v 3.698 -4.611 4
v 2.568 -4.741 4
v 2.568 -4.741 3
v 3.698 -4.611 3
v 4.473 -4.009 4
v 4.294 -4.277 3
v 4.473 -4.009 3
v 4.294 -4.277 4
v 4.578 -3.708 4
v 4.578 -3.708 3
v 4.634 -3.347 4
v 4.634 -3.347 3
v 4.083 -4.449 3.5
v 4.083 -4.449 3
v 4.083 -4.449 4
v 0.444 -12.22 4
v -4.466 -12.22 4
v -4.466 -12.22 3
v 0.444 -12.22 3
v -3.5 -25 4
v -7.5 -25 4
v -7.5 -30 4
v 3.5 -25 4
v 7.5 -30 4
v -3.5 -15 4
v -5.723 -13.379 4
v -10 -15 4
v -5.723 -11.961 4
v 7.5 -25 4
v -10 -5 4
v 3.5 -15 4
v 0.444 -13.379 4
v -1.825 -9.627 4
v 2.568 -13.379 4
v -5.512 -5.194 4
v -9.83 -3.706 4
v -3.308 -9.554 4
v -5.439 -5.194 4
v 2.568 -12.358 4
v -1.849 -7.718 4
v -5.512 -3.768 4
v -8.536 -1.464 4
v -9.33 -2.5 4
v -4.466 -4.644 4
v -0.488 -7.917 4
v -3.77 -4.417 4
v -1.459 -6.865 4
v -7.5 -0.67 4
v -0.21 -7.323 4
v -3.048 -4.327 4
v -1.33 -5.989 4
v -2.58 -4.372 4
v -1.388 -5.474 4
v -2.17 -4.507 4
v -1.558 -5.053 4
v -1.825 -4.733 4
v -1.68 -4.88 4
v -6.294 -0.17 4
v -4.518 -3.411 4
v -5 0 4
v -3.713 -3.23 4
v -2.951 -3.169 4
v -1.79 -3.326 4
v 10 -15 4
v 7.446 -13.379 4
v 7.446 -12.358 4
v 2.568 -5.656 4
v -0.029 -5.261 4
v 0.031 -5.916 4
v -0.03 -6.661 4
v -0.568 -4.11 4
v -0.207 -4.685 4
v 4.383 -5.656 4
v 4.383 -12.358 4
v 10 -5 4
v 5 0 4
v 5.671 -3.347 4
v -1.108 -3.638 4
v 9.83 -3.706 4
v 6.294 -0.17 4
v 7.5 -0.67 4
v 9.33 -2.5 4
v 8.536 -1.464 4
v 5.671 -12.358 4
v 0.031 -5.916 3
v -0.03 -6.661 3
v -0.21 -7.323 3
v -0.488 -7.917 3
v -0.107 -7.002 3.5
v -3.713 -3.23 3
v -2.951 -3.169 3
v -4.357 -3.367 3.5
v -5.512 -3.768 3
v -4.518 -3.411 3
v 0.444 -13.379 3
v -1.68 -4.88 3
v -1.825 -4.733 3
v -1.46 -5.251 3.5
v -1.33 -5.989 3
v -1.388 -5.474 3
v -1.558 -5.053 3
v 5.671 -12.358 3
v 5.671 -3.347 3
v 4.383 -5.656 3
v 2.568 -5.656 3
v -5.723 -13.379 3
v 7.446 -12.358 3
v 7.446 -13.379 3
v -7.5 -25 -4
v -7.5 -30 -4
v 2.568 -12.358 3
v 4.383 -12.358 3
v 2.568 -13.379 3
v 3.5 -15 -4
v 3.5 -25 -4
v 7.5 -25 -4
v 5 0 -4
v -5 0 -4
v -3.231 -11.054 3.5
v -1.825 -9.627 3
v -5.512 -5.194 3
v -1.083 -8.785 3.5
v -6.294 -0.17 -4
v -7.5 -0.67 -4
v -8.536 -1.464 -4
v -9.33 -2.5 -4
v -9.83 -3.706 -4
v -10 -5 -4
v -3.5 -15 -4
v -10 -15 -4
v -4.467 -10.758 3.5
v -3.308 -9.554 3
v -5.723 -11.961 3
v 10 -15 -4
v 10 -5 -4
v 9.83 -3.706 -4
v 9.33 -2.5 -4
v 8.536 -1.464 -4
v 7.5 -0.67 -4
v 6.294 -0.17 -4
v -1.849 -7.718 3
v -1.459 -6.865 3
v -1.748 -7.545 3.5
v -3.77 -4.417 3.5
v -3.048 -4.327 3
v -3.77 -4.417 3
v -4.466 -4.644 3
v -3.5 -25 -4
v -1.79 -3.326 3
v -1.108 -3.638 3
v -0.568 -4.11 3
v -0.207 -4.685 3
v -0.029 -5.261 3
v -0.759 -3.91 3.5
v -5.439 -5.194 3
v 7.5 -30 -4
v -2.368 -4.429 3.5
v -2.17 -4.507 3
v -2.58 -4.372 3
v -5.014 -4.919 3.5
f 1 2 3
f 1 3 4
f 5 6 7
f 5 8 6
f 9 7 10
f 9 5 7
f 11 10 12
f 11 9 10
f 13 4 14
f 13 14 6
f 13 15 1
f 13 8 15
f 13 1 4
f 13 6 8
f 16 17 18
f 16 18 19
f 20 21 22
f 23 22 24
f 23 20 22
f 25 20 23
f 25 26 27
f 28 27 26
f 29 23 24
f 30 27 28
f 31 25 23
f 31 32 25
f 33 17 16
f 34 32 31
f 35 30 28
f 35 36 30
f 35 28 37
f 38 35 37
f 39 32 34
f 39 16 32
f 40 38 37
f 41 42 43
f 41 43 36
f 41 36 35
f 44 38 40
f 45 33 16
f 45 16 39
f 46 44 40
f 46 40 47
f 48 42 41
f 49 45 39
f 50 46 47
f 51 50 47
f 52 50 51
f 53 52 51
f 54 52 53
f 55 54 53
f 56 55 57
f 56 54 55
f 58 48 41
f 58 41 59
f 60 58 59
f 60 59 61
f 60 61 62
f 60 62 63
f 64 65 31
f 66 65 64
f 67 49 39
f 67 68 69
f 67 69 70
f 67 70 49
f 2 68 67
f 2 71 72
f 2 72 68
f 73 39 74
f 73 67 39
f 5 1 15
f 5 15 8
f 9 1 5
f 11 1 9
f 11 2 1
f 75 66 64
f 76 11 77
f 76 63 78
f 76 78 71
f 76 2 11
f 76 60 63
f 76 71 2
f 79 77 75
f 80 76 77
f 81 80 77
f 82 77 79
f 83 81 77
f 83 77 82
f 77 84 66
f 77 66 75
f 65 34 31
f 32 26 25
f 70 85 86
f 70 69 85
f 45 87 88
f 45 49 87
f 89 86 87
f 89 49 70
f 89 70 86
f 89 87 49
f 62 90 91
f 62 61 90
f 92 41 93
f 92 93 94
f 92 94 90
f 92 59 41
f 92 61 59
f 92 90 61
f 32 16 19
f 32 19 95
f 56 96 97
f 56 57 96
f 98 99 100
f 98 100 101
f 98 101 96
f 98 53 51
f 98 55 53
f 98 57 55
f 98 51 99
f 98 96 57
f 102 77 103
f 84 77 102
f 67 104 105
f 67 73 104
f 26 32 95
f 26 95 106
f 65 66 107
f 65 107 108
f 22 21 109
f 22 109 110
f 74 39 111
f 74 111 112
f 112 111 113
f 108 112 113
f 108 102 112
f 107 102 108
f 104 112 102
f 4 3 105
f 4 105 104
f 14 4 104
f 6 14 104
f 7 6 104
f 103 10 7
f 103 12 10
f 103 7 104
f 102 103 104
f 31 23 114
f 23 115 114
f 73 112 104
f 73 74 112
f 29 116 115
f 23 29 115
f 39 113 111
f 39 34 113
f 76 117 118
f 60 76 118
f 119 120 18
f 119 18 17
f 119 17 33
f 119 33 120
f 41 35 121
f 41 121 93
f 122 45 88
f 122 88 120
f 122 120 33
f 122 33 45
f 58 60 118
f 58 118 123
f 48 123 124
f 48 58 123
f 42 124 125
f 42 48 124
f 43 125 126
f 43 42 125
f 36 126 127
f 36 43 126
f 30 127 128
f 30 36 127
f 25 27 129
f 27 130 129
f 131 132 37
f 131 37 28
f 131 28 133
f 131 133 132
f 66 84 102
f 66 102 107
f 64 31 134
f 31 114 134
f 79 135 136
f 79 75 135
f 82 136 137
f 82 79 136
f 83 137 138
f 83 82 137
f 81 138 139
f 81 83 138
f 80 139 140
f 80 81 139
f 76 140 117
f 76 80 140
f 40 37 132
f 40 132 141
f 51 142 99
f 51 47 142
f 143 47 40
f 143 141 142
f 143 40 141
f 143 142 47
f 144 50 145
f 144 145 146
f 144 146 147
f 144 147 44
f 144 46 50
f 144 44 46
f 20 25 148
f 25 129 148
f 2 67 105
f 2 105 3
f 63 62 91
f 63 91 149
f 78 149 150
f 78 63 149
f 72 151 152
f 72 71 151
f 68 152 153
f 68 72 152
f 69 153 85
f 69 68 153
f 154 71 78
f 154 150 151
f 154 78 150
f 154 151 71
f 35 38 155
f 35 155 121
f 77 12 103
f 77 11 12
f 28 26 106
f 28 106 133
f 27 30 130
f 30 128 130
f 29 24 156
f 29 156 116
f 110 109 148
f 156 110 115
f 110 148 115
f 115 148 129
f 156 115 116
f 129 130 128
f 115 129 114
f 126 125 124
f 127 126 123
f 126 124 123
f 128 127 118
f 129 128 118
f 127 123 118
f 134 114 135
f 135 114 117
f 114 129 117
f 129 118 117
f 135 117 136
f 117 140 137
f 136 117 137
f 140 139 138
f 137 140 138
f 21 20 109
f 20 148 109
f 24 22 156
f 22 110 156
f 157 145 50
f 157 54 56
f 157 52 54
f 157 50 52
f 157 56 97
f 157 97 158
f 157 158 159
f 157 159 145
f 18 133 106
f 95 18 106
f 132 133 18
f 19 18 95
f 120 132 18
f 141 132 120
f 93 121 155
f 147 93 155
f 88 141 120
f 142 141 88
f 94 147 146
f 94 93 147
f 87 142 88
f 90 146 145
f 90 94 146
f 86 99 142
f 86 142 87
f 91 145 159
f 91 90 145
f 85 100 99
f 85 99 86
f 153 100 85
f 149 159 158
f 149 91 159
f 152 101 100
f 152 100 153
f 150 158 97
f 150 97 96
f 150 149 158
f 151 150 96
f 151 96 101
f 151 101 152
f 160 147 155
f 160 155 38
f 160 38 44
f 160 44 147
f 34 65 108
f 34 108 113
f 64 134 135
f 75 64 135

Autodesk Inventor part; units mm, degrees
ref_plane "XZ Plane" through (0, 0, 0) normal (0, 1, 0) x (-1, 0, 0)
ref_plane "XY Plane" through (0, 0, 0) normal (0, 0, 1) x (1, 0, 0)
sketch "스케치1" plane through (0, 0, 0) normal (0, 0, 1) x (1, 0, 0)
  line L0 (0, 0) -> (-10, 0)
  line L1 (-10, 0) -> (-10, -15)
  line L2 (-10, -15) -> (-3.5, -15)
  line L3 (-3.5, -15) -> (-3.5, -25)
  line L4 (-3.5, -25) -> (-7.5, -25)
  line L5 (-7.5, -25) -> (-7.5, -30)
  line L6 (-7.5, -30) -> (0, -30)
  line L7 (0, 0) -> (0, -30)
  dimension "d0" = 10
  dimension "d1" = 15
  dimension "d2" = 10
  dimension "d3" = 5
  dimension "d4" = 7.5
  dimension "d12" = 3.5
extrude "돌출1" add sketch "스케치1" along normal mid plane 8
mirror "미러1" about plane through (0, 0, 0) normal (1, 0, 0) of "돌출1"
fillet "모깎기1" radius 5 2 edges at (10, 0, 0) (-10, 0, 0)
sketch "스케치2" plane through (0, 0, 4) normal (0, 0, 1) x (1, 0, 0)
  line L0 (-6.452, -3.1686) -> (7.8296, -3.1686) construction
  line L1 (7.8296, -3.1686) -> (7.8296, -13.9142) construction
  line L2 (7.8296, -13.9142) -> (-6.452, -13.9142) construction
  line L3 (-6.452, -13.9142) -> (-6.452, -3.1686) construction
  line L4 (0.4443, -13.3793) -> (-5.7226, -13.3793)
  line L5 (-5.7226, -13.3793) -> (-5.7226, -11.9611)
  spline S0 degree 2 poles (-5.7226, -11.9611) (-5.0581, -11.3371) (-3.875, -10.1783) (-3.3077, -9.5543) knots 0 0 0 1 2 2 2
  spline S1 degree 2 poles (-3.3077, -9.5543) (-2.1651, -8.2982) (-1.3304, -6.7909) (-1.3304, -5.9887) knots 0 0 0 1 2 2 2
  spline S2 degree 2 poles (-1.3304, -5.9887) (-1.3304, -5.5673) (-1.5897, -4.9352) (-1.8247, -4.7326) knots 0 0 0 1 2 2 2
  spline S3 degree 2 poles (-1.8247, -4.7326) (-2.0597, -4.53) (-2.6756, -4.3274) (-3.0484, -4.3274) knots 0 0 0 1 2 2 2
  spline S4 degree 2 poles (-3.0484, -4.3274) (-3.405, -4.3274) (-4.1343, -4.5057) (-4.4665, -4.6435) knots 0 0 0 1 2 2 2
  spline S5 degree 2 poles (-4.4665, -4.6435) (-4.7502, -4.7569) (-5.2769, -5.0811) (-5.439, -5.1945) knots 0 0 0 1 2 2 2
  line L6 (-5.439, -5.1945) -> (-5.5119, -5.1945)
  line L7 (-5.5119, -5.1945) -> (-5.5119, -3.7683)
  spline S6 degree 2 poles (-5.5119, -3.7683) (-5.0986, -3.5657) (-3.6157, -3.1686) (-2.9511, -3.1686) knots 0 0 0 1 2 2 2
  spline S7 degree 2 poles (-2.9511, -3.1686) (-1.5492, -3.1686) (0.031, -4.6516) (0.031, -5.9157) knots 0 0 0 1 2 2 2
  spline S8 degree 2 poles (0.031, -5.9157) (0.031, -6.5073) (-0.2445, -7.496) (-0.4876, -7.9174) knots 0 0 0 1 2 2 2
  spline S9 degree 2 poles (-0.4876, -7.9174) (-0.7307, -8.355) (-1.4358, -9.214) (-1.8247, -9.6272) knots 0 0 0 1 2 2 2
  spline S10 degree 2 poles (-1.8247, -9.6272) (-2.4568, -10.3161) (-4.0046, -11.7909) (-4.4665, -12.2204) knots 0 0 0 1 2 2 2
  line L8 (-4.4665, -12.2204) -> (0.4443, -12.2204)
  line L9 (0.4443, -12.2204) -> (0.4443, -13.3793)
  line L10 (7.4459, -13.3793) -> (2.5675, -13.3793)
  line L11 (2.5675, -13.3793) -> (2.5675, -12.3582)
  line L12 (2.5675, -12.3582) -> (4.3827, -12.3582)
  line L13 (4.3827, -12.3582) -> (4.3827, -5.6564)
  line L14 (4.3827, -5.6564) -> (2.5675, -5.6564)
  line L15 (2.5675, -5.6564) -> (2.5675, -4.7407)
  spline S11 degree 2 poles (2.5675, -4.7407) (3.5967, -4.7407) (4.5691, -4.1572) (4.6339, -3.3469) knots 0 0 0 1 2 2 2
  line L16 (4.6339, -3.3469) -> (5.6712, -3.3469)
  line L17 (5.6712, -3.3469) -> (5.6712, -12.3582)
  line L18 (5.6712, -12.3582) -> (7.4459, -12.3582)
  line L19 (7.4459, -12.3582) -> (7.4459, -13.3793)
  point P0 (0, 0)
extrude "돌출2" cut sketch "스케치2" against normal blind 1
properties part number "2번부품"
